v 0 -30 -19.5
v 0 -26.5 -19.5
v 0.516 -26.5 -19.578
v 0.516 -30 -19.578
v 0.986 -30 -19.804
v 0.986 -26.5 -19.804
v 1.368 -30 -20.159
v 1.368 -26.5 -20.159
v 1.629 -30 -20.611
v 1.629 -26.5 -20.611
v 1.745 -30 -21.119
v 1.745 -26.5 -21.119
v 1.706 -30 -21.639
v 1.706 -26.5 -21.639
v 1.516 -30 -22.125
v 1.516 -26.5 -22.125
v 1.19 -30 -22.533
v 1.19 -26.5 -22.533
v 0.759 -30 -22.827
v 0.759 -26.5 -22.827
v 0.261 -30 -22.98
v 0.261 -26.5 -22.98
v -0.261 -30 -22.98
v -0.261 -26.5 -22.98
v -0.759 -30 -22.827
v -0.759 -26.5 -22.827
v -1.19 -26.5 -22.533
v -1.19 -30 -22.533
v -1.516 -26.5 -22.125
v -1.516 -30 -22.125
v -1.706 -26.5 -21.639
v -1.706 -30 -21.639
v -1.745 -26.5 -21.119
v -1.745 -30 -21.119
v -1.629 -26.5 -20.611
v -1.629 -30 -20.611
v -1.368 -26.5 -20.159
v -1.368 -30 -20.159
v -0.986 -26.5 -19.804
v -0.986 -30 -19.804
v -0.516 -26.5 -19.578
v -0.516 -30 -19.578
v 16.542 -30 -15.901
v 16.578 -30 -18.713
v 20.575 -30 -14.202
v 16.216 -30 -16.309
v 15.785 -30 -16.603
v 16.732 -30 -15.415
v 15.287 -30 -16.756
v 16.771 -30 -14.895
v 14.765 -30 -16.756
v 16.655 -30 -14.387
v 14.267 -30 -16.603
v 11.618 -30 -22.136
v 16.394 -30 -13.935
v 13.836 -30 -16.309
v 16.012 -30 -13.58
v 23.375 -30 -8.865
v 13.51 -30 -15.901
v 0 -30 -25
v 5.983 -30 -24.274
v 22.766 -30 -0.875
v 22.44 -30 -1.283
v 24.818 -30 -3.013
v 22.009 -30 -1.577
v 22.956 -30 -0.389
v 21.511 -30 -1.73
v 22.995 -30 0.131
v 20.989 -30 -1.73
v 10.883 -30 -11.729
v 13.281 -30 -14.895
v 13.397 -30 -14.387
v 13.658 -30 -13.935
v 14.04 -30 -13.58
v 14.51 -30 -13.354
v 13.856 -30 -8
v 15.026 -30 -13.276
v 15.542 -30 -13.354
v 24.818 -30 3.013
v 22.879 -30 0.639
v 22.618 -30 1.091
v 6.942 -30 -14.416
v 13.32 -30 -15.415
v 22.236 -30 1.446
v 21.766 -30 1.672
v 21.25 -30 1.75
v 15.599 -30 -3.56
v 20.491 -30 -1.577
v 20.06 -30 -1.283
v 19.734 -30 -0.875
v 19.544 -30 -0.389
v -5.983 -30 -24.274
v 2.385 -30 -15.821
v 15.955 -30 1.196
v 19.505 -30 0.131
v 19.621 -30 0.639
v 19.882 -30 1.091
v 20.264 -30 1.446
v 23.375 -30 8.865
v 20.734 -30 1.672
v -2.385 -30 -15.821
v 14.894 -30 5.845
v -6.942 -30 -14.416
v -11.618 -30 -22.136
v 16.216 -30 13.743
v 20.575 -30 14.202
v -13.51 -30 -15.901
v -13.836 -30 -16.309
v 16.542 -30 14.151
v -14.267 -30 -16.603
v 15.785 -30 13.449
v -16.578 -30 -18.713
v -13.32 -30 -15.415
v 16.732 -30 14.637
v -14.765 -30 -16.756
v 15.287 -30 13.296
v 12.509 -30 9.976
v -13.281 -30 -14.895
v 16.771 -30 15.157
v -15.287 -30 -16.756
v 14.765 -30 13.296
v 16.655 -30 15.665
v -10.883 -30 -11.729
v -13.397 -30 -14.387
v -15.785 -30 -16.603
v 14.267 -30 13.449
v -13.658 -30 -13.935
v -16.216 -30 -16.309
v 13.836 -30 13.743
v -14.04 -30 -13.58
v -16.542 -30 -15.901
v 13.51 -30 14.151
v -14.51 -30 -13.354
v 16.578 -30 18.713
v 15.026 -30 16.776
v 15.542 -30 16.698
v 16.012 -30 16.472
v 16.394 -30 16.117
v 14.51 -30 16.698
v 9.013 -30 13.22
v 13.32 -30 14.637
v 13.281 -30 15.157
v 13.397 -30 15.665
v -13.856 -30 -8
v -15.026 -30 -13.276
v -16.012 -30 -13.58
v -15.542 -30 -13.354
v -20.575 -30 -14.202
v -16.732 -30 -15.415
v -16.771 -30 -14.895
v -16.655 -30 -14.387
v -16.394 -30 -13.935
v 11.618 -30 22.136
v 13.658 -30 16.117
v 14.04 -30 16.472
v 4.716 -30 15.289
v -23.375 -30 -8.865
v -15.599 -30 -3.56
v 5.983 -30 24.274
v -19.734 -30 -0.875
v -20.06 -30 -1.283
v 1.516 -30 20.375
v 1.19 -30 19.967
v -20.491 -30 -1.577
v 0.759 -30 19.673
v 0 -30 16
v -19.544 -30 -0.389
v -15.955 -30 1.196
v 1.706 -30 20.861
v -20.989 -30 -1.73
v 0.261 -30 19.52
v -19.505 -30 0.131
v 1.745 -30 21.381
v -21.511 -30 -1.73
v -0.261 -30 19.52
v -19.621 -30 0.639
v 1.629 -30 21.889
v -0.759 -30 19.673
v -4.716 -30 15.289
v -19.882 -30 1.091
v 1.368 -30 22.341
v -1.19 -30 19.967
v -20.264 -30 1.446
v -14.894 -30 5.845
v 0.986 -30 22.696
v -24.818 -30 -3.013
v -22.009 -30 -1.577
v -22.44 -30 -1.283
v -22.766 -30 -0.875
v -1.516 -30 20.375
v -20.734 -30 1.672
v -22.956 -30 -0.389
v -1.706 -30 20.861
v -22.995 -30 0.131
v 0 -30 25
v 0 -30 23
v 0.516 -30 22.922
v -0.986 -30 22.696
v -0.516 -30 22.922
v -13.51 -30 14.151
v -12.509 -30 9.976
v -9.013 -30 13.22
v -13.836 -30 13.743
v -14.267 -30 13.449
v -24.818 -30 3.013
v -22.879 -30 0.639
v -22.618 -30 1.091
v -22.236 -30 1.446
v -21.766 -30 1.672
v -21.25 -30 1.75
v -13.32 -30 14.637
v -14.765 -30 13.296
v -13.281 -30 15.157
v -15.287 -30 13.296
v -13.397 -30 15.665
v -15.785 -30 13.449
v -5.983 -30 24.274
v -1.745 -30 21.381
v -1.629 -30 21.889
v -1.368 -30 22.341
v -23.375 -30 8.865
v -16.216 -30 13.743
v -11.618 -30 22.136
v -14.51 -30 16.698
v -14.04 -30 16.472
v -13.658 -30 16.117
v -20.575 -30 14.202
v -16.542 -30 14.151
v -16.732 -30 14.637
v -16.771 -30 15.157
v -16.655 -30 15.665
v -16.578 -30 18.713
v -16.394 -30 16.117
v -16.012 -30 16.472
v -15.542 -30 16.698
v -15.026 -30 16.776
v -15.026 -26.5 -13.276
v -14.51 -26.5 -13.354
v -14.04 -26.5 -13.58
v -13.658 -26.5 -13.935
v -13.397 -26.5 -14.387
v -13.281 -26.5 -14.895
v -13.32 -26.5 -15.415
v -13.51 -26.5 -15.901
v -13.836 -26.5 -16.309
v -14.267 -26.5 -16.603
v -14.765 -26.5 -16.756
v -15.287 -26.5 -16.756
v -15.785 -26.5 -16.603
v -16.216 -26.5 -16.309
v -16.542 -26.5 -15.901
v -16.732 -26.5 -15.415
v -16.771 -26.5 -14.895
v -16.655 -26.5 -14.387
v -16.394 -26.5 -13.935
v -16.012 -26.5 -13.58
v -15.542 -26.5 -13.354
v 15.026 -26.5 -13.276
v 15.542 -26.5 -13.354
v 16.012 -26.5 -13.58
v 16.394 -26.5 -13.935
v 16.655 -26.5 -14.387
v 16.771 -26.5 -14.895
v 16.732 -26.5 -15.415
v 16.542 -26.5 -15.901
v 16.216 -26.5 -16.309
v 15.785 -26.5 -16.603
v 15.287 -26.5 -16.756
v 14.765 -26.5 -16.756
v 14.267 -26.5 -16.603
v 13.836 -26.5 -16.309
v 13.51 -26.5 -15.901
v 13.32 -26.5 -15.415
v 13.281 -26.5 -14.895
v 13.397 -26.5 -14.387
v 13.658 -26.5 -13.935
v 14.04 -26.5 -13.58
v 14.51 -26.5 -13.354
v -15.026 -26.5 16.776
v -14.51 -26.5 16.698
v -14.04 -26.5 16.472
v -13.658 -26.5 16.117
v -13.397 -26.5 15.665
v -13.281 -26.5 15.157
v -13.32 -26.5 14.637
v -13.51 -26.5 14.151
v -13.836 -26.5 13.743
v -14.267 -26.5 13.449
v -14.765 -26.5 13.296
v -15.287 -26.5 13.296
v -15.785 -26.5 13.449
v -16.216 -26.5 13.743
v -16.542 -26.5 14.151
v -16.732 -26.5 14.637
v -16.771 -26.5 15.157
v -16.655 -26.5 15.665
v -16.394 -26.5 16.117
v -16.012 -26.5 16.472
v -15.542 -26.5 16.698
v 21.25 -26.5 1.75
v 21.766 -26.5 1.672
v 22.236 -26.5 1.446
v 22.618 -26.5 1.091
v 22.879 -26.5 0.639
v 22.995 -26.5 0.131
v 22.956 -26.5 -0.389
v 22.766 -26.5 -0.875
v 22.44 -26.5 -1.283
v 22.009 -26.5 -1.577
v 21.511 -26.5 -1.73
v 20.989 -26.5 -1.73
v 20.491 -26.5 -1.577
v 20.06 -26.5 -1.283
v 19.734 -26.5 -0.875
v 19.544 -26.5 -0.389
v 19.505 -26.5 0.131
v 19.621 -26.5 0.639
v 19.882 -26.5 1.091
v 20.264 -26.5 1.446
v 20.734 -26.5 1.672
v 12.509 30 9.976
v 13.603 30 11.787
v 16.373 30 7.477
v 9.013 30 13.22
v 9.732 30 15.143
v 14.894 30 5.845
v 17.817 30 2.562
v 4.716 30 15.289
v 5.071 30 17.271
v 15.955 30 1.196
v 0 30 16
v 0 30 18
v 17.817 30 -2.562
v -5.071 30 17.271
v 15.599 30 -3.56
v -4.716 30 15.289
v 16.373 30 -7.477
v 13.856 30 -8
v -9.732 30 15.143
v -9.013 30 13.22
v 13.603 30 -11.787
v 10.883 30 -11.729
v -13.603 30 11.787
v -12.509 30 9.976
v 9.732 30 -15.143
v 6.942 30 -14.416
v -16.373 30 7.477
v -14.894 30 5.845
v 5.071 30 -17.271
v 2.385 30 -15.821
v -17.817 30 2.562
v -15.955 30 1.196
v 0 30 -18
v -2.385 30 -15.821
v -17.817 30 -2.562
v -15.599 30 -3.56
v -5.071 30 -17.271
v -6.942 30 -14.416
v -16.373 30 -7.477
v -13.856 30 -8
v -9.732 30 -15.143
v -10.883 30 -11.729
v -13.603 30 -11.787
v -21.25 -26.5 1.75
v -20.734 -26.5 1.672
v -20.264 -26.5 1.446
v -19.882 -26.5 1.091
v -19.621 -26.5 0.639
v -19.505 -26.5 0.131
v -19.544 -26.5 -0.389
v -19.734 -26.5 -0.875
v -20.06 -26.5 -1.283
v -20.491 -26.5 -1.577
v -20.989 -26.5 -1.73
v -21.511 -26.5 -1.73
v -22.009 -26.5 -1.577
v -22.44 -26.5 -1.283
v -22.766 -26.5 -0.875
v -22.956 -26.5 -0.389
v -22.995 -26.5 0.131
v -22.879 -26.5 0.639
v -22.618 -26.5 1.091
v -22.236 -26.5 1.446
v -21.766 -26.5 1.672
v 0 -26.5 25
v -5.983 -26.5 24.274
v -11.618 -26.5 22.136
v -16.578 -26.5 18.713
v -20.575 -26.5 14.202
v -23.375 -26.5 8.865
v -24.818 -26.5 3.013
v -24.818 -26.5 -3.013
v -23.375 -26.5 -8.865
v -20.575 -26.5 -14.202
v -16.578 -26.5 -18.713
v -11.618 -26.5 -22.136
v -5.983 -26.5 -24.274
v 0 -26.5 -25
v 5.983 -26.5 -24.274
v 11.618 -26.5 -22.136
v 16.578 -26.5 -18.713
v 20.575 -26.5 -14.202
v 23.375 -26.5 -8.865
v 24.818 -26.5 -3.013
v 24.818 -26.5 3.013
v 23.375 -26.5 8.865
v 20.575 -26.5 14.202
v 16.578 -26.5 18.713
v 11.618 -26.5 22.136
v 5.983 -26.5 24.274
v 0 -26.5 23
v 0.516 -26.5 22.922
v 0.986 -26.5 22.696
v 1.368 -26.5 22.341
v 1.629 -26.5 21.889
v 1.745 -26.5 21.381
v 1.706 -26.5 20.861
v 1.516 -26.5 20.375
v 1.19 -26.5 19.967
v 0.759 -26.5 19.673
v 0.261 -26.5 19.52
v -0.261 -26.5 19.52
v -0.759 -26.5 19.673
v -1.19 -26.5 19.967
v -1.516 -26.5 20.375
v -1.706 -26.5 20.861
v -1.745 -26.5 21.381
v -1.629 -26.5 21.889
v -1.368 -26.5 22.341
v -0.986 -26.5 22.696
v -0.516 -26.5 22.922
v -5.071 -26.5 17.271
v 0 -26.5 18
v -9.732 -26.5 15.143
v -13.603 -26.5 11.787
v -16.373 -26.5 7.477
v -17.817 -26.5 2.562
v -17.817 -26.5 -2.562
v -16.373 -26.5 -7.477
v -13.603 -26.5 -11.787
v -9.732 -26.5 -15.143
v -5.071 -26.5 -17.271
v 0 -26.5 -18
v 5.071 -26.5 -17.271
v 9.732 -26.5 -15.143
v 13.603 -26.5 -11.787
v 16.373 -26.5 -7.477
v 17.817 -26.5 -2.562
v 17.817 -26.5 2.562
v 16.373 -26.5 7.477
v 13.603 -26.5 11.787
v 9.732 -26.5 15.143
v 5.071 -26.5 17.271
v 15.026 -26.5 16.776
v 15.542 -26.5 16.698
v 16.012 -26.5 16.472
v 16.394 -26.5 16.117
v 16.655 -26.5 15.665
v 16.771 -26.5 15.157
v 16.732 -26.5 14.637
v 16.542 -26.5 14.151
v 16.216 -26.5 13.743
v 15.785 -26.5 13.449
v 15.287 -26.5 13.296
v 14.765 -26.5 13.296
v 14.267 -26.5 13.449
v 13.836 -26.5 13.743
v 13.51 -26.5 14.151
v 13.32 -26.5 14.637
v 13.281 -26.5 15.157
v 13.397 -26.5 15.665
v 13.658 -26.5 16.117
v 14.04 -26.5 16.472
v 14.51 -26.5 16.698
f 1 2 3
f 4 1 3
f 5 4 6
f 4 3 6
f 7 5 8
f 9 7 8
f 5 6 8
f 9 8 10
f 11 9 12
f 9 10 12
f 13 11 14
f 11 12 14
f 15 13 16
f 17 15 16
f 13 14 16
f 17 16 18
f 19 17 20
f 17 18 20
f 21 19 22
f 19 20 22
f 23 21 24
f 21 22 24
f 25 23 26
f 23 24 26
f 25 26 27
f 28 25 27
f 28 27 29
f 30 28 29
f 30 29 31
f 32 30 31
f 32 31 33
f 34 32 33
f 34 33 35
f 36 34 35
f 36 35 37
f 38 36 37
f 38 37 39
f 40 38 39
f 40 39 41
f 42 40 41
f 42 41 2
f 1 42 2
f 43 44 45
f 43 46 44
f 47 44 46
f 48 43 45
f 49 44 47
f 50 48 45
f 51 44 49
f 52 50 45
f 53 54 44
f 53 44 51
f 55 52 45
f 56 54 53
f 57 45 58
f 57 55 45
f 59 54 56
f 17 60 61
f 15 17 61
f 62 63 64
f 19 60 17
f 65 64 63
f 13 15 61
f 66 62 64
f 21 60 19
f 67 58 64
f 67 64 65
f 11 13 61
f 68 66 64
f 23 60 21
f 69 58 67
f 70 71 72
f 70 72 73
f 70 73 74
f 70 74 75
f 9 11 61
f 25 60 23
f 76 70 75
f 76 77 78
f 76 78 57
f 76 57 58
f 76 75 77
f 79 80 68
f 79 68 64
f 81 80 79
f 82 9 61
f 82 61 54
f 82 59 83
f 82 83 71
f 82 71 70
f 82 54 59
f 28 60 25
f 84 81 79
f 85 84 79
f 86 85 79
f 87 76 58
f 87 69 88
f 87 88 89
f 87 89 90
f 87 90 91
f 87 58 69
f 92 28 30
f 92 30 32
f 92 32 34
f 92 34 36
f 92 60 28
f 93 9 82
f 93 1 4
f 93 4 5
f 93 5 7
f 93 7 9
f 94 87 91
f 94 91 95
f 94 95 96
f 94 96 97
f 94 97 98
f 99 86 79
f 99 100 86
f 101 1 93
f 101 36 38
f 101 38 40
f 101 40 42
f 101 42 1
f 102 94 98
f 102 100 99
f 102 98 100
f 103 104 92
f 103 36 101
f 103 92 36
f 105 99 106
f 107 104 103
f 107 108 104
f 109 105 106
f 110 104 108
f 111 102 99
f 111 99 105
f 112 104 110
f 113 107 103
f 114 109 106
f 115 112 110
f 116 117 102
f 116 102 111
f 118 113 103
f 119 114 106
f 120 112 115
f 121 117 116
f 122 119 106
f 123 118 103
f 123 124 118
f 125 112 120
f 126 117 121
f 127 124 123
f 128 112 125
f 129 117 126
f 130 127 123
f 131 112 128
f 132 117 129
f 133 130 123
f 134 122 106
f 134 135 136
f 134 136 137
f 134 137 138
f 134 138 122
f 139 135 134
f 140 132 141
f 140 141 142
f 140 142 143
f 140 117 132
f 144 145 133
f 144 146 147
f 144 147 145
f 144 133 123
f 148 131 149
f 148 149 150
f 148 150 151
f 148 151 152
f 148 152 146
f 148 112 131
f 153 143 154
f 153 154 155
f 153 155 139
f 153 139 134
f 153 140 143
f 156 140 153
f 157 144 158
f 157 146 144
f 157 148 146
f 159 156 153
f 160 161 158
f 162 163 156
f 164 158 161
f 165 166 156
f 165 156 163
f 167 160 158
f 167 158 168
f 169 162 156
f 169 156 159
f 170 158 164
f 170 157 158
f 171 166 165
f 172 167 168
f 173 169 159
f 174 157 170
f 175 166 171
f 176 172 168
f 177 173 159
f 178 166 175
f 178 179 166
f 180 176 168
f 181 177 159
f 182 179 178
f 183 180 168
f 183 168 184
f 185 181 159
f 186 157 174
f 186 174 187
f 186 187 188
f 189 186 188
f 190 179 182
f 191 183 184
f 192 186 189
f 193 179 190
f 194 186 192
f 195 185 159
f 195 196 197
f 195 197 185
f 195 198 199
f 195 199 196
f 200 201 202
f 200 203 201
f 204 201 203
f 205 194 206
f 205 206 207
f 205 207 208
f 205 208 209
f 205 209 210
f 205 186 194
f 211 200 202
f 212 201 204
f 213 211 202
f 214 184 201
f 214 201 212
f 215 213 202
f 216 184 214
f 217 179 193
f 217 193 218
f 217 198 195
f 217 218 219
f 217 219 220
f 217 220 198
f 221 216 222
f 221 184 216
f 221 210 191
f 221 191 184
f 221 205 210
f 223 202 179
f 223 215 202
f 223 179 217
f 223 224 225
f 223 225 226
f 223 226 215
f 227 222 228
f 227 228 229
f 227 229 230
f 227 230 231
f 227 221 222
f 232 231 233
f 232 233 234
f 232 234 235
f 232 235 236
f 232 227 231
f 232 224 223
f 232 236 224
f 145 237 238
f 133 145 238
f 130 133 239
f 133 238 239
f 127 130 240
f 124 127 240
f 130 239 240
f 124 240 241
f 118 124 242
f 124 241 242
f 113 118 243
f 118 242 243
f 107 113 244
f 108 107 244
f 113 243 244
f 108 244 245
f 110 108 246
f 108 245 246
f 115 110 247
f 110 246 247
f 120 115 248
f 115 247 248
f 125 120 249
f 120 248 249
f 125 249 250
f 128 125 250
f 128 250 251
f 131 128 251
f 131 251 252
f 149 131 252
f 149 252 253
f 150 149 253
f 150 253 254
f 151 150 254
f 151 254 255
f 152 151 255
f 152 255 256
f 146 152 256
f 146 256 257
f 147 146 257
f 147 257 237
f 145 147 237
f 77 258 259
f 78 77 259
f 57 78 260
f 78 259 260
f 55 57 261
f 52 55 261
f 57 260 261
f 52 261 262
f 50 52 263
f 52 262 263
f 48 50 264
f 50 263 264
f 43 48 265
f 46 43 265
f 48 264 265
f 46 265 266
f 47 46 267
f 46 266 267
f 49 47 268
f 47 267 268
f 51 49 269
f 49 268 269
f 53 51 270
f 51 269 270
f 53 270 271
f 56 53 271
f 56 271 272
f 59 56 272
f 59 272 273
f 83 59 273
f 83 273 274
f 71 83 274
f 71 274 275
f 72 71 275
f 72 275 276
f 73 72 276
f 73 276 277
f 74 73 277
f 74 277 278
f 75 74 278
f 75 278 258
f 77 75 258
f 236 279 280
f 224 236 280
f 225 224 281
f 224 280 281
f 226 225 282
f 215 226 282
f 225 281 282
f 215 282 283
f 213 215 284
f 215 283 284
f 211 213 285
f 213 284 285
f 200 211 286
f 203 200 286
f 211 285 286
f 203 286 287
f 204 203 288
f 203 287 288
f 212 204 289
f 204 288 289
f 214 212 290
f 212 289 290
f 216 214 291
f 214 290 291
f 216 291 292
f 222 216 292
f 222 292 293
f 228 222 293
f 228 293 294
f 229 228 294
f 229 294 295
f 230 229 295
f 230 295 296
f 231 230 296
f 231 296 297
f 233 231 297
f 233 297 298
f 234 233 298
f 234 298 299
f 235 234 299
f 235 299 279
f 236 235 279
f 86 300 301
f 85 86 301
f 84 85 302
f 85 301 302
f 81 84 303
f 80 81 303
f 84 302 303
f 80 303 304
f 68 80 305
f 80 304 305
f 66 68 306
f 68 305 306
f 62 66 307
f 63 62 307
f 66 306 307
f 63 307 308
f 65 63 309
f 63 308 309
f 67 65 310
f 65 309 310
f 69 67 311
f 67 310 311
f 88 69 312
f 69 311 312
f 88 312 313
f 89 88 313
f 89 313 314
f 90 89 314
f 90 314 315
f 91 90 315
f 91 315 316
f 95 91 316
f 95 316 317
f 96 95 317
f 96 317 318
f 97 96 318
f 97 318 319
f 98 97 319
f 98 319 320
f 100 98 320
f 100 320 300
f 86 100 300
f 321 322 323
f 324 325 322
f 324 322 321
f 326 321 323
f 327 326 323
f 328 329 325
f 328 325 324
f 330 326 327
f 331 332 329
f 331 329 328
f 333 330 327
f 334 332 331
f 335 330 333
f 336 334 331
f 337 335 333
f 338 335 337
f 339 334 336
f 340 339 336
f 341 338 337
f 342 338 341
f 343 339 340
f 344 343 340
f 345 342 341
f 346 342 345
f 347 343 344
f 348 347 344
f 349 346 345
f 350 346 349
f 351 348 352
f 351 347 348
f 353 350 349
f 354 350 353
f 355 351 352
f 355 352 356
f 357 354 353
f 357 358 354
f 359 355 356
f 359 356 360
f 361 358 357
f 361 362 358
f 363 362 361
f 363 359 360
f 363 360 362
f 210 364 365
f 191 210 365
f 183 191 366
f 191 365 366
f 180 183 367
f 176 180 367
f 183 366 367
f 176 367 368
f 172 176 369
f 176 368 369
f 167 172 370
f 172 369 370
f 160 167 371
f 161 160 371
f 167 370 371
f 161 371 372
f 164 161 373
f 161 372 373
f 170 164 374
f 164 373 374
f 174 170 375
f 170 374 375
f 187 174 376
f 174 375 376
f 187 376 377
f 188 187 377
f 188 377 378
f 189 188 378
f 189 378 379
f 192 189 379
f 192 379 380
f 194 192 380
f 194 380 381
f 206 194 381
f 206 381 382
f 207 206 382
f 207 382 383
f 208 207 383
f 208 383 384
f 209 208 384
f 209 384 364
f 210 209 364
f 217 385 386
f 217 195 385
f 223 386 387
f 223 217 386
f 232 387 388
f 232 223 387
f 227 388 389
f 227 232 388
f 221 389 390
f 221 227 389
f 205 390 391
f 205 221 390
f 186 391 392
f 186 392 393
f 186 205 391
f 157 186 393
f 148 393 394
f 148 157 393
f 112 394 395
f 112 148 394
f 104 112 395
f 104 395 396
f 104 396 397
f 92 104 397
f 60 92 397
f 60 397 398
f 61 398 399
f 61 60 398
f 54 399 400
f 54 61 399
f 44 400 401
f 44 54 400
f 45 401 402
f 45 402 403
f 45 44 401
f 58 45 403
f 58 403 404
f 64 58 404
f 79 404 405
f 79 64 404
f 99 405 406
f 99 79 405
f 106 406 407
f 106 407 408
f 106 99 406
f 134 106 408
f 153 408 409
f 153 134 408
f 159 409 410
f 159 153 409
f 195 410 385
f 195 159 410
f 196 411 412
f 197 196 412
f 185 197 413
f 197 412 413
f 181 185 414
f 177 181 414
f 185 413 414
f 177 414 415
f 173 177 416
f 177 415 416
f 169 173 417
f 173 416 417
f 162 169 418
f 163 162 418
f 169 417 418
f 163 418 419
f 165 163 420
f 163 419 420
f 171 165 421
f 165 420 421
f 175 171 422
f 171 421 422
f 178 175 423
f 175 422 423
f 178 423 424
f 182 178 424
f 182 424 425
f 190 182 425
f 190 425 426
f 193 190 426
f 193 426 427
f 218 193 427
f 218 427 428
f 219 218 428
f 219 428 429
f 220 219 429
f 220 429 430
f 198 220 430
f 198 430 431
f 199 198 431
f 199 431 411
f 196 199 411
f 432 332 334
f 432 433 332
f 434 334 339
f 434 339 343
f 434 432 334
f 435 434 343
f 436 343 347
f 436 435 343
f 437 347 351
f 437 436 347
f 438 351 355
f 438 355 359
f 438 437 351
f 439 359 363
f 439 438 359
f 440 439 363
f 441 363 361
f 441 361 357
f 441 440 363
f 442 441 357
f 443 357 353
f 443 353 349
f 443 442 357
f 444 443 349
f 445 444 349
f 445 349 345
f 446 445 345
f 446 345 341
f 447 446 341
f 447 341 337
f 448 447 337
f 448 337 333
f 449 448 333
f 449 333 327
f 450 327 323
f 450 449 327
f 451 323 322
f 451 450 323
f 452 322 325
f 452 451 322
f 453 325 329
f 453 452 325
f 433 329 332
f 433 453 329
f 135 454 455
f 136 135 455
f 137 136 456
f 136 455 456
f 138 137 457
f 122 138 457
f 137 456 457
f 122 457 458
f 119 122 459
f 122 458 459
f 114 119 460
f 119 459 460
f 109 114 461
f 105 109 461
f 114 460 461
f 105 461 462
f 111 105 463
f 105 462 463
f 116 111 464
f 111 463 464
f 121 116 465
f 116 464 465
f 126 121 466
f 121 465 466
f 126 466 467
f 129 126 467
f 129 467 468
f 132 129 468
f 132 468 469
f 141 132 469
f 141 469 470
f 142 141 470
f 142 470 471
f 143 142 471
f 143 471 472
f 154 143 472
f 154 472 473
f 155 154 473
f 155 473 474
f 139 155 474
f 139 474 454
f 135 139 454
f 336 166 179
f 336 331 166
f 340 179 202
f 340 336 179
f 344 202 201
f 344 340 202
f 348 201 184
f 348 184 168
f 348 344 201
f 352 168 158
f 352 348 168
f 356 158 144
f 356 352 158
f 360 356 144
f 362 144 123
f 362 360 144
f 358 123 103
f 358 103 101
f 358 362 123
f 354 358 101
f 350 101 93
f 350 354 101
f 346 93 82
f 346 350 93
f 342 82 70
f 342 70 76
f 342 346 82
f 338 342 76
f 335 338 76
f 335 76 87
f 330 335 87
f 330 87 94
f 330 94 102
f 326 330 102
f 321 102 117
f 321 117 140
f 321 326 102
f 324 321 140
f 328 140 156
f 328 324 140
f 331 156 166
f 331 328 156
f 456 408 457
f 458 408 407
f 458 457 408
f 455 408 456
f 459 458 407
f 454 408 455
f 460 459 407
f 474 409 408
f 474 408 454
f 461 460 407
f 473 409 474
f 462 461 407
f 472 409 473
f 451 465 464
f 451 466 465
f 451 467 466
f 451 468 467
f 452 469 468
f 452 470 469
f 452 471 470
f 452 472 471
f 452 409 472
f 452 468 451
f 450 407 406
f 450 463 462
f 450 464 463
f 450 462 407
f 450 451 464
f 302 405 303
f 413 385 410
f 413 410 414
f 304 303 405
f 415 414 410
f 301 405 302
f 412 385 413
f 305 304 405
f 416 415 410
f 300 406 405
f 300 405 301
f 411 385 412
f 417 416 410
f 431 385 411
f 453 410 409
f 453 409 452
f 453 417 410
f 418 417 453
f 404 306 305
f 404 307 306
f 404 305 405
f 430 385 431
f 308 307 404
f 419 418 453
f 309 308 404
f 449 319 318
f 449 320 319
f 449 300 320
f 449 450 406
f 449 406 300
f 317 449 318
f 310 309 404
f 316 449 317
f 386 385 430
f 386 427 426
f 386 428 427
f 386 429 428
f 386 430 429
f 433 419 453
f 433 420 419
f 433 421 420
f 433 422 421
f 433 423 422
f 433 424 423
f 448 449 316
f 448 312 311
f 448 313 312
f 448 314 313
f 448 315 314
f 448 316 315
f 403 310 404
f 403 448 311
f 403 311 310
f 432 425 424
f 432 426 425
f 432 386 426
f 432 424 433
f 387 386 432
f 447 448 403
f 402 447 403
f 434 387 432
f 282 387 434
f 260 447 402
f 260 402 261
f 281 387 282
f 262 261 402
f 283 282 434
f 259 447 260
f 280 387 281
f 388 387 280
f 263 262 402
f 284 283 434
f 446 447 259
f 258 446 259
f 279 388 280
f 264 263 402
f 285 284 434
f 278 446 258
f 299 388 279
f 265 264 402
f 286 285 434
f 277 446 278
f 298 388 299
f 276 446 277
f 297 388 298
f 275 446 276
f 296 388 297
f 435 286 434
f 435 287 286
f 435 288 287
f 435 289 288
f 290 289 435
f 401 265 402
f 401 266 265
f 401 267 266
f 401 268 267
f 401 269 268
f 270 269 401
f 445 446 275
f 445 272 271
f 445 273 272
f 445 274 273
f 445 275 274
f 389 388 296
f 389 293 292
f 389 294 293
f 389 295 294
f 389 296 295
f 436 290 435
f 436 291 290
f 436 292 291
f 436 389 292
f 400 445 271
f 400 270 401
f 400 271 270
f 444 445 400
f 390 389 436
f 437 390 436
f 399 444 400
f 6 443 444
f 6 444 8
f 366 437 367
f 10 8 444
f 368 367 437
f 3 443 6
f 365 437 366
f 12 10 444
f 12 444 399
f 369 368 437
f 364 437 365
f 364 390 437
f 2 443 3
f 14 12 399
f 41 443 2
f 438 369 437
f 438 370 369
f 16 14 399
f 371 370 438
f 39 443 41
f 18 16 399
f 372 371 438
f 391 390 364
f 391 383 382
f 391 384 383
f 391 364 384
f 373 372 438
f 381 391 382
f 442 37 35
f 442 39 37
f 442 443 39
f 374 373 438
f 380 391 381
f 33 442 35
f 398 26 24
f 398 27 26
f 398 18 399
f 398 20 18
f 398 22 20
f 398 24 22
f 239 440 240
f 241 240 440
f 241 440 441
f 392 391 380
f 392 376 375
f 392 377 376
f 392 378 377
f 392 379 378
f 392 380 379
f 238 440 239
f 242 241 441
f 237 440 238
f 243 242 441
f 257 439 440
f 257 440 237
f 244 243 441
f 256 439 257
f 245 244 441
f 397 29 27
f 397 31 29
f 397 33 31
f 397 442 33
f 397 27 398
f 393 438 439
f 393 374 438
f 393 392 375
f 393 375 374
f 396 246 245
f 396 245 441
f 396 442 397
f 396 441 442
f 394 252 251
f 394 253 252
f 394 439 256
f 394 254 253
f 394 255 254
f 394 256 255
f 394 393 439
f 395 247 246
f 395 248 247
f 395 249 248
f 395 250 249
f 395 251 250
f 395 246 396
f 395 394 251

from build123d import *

# Parameters (mm, degrees)
SKETCH2_R          = 1.75
CUT_EXTRUDE1_DEPTH = 10


with BuildPart() as part:
    # Sketch1 → Revolve1 (revolve)
    with BuildSketch(Plane.XY, mode=Mode.PRIVATE) as revolve1_sk:
        Polygon((-18, 30), (-18, -26.5), (-25, -26.5), (-25, -30), (-16, -30), (-16, 30), align=None)
    revolve(revolve1_sk.sketch.rotate(Axis((0, 40.25, 0), (0, -1, 0)), 270), axis=Axis((0, 40.25, 0), (0, -1, 0)))

    # Sketch2 → Cut-Extrude1 (cut)
    with BuildSketch(Plane(origin=(0, -26.5, 0), x_dir=(1, 0, 0), z_dir=(0, 1, 0))):
        with Locations(Location((0, 21.25, 0), (0, 0, 270))):
            Circle(SKETCH2_R)
        with Locations(Location((15.0260191, 15.0260191, 0), (0, 0, 270))):
            Circle(SKETCH2_R)
        with Locations(Location((21.25, 0, 0), (0, 0, 270))):
            Circle(SKETCH2_R)
        with Locations(Location((15.0260191, -15.0260191, 0), (0, 0, 270))):
            Circle(SKETCH2_R)
        with Locations(Location((0, -21.25, 0), (0, 0, 270))):
            Circle(SKETCH2_R)
        with Locations(Location((-15.0260191, -15.0260191, 0), (0, 0, 270))):
            Circle(SKETCH2_R)
        with Locations(Location((-21.25, 0, 0), (0, 0, 270))):
            Circle(SKETCH2_R)
        with Locations(Location((-15.0260191, 15.0260191, 0), (0, 0, 270))):
            Circle(SKETCH2_R)
    extrude(amount=-CUT_EXTRUDE1_DEPTH, mode=Mode.SUBTRACT)


solid = part.part
